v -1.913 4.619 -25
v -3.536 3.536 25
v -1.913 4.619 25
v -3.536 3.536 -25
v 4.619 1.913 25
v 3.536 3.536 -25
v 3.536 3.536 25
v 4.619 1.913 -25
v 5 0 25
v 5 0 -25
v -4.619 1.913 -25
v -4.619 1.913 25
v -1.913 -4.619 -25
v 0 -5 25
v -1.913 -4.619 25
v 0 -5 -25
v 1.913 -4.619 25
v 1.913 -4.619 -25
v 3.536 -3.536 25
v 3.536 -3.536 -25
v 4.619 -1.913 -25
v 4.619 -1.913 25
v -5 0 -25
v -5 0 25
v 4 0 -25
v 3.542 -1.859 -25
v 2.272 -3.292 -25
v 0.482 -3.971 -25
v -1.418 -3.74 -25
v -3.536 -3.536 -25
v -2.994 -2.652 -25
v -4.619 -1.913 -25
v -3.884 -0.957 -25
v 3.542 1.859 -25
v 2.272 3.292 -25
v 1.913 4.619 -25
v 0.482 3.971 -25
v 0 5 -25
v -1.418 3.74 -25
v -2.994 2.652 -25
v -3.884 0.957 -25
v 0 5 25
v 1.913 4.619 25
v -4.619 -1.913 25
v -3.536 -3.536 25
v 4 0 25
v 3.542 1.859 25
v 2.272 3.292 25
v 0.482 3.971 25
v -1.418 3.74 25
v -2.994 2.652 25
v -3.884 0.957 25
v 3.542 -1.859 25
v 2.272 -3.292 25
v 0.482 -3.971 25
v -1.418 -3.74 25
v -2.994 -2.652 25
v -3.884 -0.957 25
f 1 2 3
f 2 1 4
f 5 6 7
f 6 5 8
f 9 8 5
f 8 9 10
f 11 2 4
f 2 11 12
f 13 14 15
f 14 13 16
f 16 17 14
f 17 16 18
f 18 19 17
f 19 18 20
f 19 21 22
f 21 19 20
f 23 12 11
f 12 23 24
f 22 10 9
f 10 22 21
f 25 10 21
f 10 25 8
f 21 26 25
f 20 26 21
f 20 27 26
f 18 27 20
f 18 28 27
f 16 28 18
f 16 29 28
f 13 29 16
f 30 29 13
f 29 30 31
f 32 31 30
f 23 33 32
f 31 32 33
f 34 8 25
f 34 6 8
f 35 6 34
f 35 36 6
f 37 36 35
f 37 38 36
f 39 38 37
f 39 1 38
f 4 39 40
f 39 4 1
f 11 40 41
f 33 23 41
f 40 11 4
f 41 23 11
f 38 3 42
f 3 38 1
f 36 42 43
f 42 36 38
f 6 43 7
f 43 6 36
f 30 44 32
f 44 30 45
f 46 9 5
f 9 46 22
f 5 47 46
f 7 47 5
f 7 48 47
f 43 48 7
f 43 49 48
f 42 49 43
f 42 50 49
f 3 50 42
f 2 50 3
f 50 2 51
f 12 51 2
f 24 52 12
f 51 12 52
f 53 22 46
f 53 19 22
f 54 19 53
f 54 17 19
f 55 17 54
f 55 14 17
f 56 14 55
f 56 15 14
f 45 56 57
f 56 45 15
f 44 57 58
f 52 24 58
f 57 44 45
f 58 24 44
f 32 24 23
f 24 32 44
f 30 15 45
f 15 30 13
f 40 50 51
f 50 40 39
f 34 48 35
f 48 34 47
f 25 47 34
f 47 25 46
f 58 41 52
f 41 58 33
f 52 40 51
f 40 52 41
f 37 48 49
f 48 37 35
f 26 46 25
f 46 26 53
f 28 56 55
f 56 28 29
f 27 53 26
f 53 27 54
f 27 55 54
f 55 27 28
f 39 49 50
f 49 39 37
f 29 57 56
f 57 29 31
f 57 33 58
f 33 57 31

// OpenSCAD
module ptfe_tube_body(OD, ID, length, centered=false) {
    difference() {
        cylinder(d=OD, h=length, center=centered);
        cylinder(d=ID, h=length + 2, center=centered);
    }
}

module hollow_bore(ID, length, centered=false) {
    cylinder(d=ID, h=length + 2, center=centered);
}

module tubing(OD, ID, length, centered=false) {
    ptfe_tube_body(OD, ID, length, centered);
}

// Example usage
tubing(10, 8, 50, true);
